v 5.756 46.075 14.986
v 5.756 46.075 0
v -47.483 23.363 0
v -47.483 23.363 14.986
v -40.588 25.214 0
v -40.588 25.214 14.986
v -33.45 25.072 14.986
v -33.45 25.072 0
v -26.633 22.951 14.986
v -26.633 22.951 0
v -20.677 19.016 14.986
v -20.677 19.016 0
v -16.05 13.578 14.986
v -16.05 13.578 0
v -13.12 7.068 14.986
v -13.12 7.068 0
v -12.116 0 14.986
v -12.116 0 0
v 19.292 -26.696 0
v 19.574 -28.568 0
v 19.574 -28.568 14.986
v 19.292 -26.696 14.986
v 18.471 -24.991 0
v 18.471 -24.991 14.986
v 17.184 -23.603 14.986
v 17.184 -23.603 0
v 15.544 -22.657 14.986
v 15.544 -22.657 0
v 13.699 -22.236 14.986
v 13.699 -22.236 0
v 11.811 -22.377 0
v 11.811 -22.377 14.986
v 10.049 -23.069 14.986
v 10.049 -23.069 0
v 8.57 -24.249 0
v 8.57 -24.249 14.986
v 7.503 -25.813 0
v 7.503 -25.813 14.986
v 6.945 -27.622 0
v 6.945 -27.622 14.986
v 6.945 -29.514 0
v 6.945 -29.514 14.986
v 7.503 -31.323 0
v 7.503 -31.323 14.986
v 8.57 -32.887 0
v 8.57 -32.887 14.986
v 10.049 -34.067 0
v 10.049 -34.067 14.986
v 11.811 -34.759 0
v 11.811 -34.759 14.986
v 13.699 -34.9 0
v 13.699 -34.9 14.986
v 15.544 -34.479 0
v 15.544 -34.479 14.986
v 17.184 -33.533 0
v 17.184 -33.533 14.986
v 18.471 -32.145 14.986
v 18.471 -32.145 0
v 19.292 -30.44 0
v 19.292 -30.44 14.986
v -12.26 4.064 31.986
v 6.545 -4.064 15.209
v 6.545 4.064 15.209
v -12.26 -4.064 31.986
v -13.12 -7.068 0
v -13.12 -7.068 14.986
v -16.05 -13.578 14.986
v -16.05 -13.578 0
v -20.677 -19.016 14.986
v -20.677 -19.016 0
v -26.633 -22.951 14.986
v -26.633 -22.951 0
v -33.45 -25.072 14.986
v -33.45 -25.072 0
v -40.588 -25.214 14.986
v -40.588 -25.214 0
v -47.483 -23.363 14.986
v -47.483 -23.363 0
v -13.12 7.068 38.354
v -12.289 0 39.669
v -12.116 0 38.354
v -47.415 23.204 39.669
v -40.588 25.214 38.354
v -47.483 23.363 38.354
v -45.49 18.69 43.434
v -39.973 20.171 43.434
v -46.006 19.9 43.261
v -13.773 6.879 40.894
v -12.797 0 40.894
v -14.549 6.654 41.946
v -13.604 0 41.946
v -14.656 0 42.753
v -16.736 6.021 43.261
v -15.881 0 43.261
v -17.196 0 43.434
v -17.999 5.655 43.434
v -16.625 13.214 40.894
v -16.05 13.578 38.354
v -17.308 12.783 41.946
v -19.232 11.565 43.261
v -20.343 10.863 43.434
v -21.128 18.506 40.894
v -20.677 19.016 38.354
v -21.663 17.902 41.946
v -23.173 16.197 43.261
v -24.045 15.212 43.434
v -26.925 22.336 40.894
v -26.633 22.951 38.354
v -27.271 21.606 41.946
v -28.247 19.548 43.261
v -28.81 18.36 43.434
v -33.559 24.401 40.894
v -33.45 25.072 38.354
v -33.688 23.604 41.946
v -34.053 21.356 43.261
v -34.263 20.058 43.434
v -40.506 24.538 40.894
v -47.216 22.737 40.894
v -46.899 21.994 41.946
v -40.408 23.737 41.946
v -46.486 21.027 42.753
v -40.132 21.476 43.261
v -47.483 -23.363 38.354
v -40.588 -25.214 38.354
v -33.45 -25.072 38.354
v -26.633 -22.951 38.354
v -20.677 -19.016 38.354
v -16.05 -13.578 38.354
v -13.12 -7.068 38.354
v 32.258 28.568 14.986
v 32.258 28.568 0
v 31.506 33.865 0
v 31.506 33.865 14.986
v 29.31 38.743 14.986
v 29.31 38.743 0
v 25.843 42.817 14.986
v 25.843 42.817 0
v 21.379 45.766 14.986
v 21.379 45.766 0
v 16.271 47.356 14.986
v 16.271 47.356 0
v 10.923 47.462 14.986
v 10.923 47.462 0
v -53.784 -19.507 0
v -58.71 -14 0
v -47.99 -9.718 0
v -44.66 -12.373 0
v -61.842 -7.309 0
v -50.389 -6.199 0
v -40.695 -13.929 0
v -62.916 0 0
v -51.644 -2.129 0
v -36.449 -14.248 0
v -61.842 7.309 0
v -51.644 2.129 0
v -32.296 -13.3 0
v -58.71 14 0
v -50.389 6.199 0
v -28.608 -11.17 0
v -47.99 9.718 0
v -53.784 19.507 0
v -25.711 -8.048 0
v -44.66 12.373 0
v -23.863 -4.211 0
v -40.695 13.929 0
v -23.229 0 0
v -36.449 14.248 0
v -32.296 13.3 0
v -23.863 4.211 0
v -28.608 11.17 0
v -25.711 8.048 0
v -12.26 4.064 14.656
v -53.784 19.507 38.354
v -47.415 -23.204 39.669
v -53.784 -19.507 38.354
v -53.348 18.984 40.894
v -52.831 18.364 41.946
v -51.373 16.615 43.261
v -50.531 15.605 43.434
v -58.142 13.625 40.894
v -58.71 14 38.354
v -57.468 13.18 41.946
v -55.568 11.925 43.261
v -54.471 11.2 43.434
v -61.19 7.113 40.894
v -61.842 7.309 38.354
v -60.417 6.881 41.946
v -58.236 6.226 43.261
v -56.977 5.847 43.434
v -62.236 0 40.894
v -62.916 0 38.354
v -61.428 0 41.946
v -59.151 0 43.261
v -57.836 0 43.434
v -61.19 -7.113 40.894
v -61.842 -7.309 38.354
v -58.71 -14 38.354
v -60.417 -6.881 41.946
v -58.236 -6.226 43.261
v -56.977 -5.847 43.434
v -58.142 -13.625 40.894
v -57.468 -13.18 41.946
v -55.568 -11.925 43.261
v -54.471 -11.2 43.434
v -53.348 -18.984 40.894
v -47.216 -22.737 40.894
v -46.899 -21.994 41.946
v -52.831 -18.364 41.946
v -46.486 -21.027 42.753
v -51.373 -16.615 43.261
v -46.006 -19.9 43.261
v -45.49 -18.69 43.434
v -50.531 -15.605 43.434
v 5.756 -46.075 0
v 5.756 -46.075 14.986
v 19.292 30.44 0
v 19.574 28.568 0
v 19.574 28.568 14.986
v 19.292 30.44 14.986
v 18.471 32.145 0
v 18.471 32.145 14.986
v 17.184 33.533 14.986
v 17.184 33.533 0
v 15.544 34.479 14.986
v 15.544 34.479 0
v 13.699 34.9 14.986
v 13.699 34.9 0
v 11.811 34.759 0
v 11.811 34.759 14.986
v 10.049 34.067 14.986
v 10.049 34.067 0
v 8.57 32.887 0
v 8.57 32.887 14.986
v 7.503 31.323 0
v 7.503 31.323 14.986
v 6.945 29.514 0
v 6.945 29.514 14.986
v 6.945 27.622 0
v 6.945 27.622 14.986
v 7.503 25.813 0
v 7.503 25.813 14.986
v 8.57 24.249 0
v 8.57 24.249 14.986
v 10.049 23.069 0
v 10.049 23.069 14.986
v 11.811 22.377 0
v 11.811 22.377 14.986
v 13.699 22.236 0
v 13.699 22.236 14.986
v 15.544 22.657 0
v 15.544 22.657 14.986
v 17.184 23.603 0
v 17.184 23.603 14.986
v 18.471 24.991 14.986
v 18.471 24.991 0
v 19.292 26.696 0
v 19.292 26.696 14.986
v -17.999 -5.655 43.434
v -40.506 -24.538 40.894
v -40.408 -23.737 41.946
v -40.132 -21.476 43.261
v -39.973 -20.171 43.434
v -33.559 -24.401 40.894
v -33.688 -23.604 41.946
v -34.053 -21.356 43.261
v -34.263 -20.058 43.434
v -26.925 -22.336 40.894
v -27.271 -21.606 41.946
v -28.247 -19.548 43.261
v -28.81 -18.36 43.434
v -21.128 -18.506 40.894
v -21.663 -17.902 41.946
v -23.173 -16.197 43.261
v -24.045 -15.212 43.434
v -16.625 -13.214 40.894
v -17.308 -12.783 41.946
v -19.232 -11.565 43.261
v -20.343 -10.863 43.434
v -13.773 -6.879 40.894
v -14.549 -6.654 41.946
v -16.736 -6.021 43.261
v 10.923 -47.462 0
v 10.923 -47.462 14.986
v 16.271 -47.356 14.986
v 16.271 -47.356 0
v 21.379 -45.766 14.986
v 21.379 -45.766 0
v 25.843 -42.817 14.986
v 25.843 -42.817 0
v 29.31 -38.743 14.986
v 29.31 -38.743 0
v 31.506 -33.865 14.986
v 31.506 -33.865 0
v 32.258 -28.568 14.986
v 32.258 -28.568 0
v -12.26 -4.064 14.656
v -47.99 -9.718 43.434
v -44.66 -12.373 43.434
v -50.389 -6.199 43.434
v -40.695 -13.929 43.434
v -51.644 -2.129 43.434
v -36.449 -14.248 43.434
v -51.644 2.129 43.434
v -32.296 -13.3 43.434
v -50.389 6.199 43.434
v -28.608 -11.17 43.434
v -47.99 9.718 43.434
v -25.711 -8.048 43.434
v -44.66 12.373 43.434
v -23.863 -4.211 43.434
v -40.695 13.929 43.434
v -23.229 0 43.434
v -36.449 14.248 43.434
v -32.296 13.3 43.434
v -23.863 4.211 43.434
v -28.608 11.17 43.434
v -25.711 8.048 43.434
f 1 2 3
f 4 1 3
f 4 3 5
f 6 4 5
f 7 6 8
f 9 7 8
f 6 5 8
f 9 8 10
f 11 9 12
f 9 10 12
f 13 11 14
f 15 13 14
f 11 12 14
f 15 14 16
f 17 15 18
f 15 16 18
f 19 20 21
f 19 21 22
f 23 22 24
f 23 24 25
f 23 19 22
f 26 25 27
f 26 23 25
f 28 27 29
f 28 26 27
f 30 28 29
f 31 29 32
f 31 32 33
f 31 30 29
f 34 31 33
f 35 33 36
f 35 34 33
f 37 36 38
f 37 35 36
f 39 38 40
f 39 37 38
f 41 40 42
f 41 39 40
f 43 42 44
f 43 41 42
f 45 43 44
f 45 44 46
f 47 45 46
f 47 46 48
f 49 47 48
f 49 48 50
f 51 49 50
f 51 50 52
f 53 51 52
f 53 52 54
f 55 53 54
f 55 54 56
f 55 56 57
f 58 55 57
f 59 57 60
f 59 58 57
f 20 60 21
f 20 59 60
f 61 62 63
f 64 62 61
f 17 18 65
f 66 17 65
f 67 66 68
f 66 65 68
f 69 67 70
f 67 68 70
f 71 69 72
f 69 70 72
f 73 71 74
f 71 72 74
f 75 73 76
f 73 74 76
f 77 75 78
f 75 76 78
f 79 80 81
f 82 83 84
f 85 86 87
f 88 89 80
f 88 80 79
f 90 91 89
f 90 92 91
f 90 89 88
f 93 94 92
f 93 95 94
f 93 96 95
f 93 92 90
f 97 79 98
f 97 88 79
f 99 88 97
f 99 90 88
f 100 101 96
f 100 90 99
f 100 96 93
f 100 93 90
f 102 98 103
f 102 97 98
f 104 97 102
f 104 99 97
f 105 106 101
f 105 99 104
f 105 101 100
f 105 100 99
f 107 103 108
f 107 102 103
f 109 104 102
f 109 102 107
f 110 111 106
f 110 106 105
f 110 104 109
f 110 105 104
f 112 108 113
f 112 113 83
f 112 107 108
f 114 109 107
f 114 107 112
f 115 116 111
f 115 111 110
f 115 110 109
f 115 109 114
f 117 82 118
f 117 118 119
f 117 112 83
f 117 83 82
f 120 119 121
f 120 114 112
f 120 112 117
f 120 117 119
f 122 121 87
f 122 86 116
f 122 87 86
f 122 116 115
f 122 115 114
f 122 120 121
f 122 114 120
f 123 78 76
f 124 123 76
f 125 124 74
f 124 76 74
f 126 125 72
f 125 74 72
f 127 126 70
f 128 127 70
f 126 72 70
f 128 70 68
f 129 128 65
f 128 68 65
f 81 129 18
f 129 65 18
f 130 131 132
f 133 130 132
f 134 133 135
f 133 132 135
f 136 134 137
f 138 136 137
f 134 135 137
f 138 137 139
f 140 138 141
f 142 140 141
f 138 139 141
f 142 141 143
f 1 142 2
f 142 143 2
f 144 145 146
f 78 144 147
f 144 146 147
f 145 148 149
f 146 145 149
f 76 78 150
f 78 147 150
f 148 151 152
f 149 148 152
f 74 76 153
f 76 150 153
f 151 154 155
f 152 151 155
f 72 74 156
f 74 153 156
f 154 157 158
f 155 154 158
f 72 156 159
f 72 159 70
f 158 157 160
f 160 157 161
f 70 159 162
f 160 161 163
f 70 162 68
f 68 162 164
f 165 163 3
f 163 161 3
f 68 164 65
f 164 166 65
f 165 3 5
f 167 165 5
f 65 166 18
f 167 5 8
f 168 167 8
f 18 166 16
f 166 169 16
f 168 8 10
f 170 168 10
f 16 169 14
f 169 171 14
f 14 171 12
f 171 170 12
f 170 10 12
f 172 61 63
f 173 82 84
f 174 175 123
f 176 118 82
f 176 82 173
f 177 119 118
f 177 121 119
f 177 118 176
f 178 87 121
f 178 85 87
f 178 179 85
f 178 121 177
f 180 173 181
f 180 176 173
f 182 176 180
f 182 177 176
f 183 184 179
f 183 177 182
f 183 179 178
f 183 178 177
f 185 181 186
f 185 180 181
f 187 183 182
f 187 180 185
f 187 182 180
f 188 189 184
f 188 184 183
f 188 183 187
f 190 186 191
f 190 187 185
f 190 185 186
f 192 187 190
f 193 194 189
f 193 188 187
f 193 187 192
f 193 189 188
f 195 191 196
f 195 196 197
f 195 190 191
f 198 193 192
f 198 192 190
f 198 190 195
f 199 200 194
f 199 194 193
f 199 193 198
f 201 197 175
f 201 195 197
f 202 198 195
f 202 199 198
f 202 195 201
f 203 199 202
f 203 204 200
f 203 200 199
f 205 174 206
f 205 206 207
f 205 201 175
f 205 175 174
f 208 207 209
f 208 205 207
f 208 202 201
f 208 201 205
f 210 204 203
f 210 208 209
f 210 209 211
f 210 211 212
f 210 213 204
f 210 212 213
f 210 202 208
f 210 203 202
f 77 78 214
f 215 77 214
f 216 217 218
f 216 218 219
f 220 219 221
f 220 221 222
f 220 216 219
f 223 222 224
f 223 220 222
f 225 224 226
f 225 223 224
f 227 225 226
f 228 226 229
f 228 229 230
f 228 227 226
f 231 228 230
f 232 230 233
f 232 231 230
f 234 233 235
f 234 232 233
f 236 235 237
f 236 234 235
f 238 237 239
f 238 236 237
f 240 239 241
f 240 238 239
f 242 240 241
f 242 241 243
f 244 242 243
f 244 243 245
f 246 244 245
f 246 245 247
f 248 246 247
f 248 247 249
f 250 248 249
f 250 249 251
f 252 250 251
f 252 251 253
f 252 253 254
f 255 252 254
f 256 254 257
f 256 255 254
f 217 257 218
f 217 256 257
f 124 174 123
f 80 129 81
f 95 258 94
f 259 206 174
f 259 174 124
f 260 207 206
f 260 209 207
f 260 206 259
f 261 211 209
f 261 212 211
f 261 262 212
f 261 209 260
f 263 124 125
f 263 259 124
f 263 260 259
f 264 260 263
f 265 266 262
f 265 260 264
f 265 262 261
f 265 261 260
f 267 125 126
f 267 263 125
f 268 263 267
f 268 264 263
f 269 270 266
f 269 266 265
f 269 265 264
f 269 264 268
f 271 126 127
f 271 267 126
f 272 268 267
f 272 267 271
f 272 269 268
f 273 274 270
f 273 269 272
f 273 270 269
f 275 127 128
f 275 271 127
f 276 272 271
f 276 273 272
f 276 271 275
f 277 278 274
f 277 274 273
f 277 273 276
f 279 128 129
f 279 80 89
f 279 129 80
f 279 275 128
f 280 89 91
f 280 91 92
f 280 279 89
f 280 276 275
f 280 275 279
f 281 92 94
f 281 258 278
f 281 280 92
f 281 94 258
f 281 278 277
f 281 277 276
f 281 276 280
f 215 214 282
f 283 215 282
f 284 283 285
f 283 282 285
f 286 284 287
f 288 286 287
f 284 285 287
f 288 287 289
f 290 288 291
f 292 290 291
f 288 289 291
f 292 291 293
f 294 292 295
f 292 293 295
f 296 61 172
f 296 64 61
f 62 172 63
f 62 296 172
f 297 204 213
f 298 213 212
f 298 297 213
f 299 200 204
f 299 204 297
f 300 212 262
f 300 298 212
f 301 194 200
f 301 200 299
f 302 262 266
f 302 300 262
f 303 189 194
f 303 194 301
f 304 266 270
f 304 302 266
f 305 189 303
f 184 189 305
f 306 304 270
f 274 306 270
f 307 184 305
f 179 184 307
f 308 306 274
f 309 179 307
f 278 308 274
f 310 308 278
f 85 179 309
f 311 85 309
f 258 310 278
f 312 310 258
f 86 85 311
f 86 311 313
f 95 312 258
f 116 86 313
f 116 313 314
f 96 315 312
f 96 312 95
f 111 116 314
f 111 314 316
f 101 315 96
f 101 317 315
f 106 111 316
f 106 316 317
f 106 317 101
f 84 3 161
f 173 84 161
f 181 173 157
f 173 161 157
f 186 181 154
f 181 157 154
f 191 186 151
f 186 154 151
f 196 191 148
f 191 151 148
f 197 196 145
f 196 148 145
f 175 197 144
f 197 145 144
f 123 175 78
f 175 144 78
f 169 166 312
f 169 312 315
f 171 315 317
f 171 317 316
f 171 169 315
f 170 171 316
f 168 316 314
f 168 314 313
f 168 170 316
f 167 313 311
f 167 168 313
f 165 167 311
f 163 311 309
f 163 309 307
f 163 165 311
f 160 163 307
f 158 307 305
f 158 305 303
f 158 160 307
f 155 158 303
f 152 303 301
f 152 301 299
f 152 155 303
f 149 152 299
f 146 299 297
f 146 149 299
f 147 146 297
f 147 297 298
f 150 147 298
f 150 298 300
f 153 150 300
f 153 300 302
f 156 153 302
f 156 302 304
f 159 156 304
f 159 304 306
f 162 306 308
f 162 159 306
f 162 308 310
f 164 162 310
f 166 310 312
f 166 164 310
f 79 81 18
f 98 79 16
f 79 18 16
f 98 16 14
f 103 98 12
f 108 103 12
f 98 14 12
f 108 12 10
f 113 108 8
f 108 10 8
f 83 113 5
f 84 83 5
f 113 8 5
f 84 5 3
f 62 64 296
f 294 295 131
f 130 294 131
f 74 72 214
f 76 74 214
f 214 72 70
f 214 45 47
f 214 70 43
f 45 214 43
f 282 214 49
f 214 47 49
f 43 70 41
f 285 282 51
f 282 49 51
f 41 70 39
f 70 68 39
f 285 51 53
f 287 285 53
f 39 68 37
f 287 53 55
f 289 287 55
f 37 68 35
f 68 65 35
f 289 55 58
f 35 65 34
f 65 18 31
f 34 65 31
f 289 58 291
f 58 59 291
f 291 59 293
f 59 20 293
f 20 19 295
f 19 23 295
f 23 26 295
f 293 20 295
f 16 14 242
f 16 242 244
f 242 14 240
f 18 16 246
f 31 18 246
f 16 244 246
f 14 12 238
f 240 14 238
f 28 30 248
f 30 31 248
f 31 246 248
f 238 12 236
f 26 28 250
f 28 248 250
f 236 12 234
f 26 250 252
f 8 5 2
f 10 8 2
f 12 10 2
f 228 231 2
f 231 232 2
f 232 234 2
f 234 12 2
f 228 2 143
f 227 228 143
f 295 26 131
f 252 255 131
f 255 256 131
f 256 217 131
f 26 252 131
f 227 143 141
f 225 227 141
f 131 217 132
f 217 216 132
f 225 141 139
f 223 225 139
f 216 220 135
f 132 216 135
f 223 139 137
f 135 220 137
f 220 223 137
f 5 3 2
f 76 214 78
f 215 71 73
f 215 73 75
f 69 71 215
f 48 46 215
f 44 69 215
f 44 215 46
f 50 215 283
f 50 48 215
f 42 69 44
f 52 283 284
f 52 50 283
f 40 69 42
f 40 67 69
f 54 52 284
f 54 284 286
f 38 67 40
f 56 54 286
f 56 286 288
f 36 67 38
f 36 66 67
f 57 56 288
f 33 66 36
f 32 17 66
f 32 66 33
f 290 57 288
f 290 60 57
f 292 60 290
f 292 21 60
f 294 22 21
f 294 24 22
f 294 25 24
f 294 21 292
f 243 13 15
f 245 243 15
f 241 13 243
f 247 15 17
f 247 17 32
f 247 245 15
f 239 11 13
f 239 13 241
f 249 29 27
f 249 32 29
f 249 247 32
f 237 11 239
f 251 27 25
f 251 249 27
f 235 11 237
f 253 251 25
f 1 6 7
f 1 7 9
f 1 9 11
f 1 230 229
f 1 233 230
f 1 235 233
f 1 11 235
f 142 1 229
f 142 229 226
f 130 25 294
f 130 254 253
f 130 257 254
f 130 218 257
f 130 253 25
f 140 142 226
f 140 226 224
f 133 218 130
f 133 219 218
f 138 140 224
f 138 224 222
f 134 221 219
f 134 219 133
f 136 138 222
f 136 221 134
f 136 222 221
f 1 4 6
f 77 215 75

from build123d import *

# Parameters (mm, degrees)
F0_R     = 14.2875
F1_DEPTH = 43.434
F0_R_2   = 6.35
F3_DEPTH = 14.986
F5_DEPTH = 4.064
F6_R     = 5.08


with BuildPart() as f1:
    # F0 (on Top) → F1 (new body)
    with BuildSketch(Plane.XY):
        with BuildLine():
            ThreePointArc((-12.11621, 0), (-23.516123, 21.193338), (-47.482947, 23.36288))
            ThreePointArc((-47.482947, 23.36288), (-62.91621, 0), (-47.482947, -23.36288))
            ThreePointArc((-47.482947, -23.36288), (-23.516123, -21.193338), (-12.11621, 0))
        make_face()
        with Locations((-37.51621, 0)):
            Circle(F0_R, mode=Mode.SUBTRACT)
    extrude(amount=F1_DEPTH)

    # F6
    f6_edges = [f1.edges().sort_by_distance(p)[0] for p in [
        (-27.549474, -23.36288, 43.434),
    ]]
    fillet(f6_edges, radius=F6_R)


with BuildPart() as f3:
    # F0 (on Top) → F3 (new body)
    with BuildSketch(Plane.XY):
        with BuildLine():
            Line((32.257856, -28.568001), (32.257856, 28.568001))
            ThreePointArc((32.257856, 28.568001), (23.715376, 44.449147), (5.755928, 46.074885))
            Line((5.755928, 46.074885), (-47.482947, 23.36288))
            ThreePointArc((-47.482947, 23.36288), (-23.516123, 21.193338), (-12.11621, 0))
            ThreePointArc((-12.11621, 0), (-23.516123, -21.193338), (-47.482947, -23.36288))
            Line((-47.482947, -23.36288), (5.755928, -46.074885))
            ThreePointArc((5.755928, -46.074885), (23.715376, -44.449147), (32.257856, -28.568001))
        make_face()
        with Locations((13.224464, -28.568001)):
            Circle(F0_R_2, mode=Mode.SUBTRACT)
        with Locations((13.224464, 28.568001)):
            Circle(F0_R_2, mode=Mode.SUBTRACT)
    extrude(amount=F3_DEPTH)


with BuildPart() as f5:
    # F4 (on Front) → F5 (new body, symmetric)
    with BuildSketch(Plane.XZ):
        Polygon((-12.259597, 14.656209), (6.544597, 15.209274), (-12.259597, 31.985562), align=None)
    extrude(amount=F5_DEPTH, both=True)


solid = Compound([f1.part, f3.part, f5.part])
